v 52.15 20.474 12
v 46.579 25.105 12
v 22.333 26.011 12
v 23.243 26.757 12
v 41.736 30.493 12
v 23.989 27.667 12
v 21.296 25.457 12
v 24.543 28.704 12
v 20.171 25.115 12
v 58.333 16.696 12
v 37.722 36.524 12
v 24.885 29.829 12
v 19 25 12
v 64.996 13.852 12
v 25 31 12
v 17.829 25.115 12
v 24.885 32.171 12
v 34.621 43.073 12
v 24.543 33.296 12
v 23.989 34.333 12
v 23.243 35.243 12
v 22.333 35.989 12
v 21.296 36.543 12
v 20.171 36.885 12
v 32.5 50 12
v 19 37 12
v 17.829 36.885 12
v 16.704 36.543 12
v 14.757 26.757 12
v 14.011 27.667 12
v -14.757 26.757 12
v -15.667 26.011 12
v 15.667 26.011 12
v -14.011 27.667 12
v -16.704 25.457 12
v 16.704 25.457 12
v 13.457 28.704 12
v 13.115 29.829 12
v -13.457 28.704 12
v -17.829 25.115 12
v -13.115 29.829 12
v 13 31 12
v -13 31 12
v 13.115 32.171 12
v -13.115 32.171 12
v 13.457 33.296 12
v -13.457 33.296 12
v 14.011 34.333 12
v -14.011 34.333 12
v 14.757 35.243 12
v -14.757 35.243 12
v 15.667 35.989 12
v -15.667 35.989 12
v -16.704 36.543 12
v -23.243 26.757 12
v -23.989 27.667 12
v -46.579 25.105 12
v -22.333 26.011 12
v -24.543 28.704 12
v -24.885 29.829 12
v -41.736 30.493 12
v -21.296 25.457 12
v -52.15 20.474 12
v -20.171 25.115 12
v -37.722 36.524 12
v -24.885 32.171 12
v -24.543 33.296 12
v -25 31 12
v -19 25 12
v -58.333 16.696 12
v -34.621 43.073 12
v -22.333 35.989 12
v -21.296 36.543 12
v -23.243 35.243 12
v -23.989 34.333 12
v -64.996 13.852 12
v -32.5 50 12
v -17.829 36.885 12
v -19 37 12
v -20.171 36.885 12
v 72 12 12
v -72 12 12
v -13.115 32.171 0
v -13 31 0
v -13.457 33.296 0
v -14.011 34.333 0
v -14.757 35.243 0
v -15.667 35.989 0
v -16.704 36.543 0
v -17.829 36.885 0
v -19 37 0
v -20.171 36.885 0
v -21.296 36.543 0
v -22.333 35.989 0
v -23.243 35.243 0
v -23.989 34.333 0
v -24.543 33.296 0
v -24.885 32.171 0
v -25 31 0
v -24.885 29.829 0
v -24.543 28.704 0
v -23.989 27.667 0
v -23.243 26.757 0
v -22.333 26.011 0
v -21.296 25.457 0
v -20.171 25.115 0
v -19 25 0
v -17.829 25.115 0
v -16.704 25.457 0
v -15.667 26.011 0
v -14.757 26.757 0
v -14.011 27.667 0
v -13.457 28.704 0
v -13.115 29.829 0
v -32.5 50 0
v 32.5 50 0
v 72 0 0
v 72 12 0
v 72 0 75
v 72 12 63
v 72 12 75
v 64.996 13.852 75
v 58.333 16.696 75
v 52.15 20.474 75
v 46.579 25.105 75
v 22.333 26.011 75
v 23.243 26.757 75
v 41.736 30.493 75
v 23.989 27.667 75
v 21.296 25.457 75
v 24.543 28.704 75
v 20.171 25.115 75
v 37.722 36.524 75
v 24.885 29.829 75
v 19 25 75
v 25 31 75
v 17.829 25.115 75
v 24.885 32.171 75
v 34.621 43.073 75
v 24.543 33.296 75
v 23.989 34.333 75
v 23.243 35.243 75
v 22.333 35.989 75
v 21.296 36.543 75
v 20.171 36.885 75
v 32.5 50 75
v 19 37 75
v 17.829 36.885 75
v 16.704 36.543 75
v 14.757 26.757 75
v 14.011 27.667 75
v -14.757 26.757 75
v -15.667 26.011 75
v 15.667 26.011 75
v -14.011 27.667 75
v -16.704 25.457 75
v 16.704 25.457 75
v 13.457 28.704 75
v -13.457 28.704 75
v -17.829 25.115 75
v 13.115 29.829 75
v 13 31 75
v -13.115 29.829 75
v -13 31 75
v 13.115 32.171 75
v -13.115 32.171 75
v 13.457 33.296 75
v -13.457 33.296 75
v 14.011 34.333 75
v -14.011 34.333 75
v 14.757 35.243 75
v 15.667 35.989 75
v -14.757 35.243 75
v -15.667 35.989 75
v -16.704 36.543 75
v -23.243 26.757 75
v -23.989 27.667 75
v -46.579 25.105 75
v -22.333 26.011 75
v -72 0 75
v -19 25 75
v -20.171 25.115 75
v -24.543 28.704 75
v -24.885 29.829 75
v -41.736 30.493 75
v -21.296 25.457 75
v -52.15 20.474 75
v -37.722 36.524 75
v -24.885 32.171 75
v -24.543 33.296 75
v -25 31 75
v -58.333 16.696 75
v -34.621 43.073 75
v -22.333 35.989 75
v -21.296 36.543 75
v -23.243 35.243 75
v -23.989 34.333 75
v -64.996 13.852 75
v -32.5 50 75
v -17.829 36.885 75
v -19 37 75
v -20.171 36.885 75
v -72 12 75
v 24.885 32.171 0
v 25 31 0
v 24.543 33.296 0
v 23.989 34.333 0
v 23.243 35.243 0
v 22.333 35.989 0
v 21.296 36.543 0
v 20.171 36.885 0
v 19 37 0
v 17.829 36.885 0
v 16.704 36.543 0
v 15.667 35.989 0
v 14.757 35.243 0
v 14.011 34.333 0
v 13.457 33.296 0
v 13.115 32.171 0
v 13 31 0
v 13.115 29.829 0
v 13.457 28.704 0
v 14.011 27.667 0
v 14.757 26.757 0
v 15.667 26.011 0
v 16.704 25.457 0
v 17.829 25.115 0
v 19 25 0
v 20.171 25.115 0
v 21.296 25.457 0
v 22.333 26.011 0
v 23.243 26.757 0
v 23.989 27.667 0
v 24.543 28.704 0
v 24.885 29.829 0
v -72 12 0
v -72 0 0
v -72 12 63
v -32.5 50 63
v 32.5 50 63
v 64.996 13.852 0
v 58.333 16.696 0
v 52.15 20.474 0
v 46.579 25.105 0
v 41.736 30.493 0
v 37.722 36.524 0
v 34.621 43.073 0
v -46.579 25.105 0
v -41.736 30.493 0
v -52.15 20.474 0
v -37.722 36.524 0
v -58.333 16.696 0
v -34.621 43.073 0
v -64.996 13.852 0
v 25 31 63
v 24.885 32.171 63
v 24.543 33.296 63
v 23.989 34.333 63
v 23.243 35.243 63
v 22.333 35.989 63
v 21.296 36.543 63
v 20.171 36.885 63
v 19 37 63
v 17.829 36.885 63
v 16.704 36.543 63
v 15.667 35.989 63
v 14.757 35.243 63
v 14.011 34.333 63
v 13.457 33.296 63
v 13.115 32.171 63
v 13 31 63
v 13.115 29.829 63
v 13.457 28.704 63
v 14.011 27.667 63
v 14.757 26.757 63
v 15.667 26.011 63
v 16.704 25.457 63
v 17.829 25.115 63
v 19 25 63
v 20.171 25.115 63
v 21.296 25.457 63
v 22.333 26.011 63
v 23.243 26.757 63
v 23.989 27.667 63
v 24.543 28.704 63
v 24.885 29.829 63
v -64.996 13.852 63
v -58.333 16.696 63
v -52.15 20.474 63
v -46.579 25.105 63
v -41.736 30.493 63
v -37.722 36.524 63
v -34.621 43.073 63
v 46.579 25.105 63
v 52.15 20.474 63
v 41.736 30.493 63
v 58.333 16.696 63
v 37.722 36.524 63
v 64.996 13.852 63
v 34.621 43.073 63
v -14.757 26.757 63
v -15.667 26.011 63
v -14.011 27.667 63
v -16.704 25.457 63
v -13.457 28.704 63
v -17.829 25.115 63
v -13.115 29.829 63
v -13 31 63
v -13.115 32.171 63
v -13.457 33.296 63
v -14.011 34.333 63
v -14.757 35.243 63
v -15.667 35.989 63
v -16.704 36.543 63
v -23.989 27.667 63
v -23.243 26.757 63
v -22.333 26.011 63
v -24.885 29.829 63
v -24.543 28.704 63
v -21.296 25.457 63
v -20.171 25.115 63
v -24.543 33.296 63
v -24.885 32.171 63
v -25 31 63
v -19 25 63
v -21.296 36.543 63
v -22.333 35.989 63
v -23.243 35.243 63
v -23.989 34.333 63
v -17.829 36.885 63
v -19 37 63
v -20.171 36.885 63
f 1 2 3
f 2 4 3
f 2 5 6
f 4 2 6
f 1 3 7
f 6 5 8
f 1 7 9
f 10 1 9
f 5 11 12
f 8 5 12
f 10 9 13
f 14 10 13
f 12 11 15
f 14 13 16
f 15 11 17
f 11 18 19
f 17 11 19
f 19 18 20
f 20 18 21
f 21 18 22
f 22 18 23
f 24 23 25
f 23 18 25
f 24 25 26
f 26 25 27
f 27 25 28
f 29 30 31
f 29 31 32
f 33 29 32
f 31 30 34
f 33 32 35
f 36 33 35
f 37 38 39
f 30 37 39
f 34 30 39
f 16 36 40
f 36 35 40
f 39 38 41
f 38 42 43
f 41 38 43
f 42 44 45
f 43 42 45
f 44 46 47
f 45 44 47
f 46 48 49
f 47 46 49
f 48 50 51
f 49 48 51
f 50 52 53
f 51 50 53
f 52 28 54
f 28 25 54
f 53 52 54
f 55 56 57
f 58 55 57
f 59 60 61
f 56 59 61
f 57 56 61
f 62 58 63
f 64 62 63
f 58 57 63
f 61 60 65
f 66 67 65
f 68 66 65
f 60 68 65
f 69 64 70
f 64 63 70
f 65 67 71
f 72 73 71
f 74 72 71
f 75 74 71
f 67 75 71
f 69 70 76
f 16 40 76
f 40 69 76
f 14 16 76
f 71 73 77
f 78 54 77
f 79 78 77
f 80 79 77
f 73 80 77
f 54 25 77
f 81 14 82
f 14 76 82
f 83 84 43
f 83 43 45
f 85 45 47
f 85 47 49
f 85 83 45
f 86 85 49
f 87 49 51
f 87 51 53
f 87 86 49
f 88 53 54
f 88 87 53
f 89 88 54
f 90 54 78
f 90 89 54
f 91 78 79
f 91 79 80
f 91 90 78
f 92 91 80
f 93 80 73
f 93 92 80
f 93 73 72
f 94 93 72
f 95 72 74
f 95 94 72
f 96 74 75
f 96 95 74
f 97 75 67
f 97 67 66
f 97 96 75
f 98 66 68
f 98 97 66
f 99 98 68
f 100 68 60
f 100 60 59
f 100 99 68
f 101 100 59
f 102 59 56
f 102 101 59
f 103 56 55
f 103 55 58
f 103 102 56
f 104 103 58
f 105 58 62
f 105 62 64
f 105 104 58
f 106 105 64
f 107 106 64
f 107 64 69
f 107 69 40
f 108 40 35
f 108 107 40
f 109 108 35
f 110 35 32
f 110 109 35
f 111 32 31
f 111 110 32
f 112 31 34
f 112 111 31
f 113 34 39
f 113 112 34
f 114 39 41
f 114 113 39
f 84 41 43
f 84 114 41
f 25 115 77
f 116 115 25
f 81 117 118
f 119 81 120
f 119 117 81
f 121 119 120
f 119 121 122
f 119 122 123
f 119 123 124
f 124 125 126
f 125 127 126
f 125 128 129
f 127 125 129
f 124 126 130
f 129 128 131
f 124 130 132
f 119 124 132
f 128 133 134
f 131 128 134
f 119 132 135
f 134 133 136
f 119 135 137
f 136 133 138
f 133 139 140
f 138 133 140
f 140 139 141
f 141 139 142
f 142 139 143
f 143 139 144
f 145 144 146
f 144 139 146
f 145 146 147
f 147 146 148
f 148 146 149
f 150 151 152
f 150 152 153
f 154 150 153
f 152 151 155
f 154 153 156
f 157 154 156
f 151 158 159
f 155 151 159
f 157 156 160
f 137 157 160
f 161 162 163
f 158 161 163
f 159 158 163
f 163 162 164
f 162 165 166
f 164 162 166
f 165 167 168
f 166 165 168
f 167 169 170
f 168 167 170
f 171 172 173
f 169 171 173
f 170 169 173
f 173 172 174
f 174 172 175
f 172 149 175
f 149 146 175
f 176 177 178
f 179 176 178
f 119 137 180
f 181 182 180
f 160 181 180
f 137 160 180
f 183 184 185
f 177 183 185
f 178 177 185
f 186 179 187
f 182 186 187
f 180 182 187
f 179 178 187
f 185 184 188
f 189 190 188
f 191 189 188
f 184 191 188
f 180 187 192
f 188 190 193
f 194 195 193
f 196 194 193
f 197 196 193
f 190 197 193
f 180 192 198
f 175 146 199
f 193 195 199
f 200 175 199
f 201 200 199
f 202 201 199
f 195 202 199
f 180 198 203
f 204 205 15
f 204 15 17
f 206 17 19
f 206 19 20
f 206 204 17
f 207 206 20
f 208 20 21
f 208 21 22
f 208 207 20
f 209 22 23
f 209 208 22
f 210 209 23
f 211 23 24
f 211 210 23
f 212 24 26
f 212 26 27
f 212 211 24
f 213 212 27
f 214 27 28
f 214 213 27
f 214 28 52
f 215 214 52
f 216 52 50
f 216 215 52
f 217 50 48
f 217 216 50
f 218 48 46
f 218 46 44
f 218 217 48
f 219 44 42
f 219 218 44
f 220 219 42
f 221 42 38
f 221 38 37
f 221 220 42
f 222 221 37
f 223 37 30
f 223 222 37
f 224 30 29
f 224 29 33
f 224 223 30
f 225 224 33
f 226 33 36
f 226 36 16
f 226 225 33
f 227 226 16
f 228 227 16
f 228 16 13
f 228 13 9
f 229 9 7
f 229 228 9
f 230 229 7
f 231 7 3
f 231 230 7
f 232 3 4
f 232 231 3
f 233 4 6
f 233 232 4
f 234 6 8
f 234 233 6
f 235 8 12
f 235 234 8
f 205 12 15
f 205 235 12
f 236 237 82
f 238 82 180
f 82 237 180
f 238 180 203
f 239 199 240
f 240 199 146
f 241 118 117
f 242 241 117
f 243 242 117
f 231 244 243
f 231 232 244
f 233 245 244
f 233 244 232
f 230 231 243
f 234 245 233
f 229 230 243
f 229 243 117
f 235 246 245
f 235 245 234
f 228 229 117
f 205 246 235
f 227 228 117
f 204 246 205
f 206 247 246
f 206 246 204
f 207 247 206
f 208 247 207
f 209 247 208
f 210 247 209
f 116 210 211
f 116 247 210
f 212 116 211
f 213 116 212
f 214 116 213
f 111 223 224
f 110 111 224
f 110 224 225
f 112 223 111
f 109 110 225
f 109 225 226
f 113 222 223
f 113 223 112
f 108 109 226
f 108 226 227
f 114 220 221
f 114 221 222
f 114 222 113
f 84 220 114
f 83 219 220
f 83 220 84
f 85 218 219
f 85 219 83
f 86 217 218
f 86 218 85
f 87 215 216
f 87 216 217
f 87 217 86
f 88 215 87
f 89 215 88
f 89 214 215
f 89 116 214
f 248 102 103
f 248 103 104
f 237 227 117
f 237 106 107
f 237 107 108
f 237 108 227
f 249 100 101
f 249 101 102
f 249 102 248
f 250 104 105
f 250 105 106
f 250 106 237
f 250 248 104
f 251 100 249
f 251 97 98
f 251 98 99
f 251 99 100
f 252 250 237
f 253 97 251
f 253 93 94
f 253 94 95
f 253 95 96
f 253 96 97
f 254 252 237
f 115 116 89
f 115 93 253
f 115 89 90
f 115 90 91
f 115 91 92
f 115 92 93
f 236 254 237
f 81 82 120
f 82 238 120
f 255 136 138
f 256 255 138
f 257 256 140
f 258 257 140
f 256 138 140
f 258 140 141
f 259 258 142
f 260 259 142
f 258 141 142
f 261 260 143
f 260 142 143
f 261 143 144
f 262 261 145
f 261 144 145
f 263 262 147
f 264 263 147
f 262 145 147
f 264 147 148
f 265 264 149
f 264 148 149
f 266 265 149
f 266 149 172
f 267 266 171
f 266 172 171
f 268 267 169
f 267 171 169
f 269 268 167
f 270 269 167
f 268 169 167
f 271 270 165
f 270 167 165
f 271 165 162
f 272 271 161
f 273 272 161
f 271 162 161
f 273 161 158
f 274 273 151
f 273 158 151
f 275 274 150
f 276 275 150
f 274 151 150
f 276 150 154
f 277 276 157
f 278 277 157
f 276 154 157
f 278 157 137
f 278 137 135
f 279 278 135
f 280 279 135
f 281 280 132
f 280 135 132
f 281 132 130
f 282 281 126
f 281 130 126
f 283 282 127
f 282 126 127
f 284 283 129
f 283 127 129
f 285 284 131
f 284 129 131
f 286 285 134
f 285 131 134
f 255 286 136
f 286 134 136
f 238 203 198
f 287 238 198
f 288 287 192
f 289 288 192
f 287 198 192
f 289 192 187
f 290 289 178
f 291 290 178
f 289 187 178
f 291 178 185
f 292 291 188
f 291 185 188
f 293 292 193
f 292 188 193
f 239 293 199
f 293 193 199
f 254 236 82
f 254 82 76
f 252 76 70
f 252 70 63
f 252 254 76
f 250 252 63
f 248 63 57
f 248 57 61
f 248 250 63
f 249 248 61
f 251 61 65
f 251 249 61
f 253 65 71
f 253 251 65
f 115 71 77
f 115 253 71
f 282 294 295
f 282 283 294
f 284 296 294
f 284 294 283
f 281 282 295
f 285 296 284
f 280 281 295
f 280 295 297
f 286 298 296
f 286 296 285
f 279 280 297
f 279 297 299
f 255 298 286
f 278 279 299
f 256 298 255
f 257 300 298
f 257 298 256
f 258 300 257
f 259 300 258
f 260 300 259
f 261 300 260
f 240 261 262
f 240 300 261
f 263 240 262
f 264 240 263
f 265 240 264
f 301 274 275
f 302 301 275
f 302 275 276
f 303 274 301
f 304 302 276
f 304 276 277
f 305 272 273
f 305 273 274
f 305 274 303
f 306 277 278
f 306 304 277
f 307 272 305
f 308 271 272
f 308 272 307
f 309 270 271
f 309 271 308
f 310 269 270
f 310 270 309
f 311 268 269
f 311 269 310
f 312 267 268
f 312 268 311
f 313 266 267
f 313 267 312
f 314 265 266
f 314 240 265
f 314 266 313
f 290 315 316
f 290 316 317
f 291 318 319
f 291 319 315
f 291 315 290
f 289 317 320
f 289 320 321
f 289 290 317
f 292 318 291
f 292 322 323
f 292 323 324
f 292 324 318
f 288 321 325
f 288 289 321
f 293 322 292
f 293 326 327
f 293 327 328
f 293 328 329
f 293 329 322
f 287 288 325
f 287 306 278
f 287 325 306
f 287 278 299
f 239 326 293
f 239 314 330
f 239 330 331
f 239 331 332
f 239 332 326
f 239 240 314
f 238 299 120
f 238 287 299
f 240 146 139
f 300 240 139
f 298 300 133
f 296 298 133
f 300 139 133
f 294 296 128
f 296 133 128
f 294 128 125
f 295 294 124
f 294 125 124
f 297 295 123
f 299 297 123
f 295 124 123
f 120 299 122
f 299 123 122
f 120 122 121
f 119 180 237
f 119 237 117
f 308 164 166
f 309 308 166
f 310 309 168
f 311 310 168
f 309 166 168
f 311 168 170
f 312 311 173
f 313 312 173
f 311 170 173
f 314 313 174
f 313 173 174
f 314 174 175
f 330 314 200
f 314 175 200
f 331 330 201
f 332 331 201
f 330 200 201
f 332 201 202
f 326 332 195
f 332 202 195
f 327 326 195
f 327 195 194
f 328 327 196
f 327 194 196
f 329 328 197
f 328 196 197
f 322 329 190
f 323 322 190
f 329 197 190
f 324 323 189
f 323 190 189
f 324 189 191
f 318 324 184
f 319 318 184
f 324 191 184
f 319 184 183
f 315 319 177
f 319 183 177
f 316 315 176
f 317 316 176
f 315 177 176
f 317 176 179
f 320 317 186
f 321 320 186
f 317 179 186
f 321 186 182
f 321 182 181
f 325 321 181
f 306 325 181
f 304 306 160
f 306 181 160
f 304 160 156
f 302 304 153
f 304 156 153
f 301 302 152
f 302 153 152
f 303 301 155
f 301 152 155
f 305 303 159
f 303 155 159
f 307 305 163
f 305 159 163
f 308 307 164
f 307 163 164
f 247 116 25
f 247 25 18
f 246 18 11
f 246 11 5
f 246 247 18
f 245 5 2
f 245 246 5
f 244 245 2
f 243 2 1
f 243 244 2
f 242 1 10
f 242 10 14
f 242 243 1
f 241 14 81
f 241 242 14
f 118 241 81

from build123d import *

# Parameters (mm, degrees)
SKETCH1_R                = 6
BOSS_EXTRUDE2_DEPTH      = 12
SKETCH3_W                = 144
SKETCH3_H                = 12
BOSS_EXTRUDE3_DEPTH      = 25.5
BOSS_EXTRUDE3_DEPTH_BACK = 25.5


with BuildPart() as part:
    # Sketch1 → Boss-Extrude2 (new body)
    with BuildSketch(Plane.XY):
        with BuildLine():
            Line((-32.5, 50), (32.5, 50))
            ThreePointArc((32.5, 50), (46.579087682, 25.10523588), (72, 12))
            Line((72, 12), (72, 0))
            Line((72, 0), (-72, 0))
            Line((-72, 0), (-72, 12))
            ThreePointArc((-72, 12), (-46.579087682, 25.10523588), (-32.5, 50))
        make_face()
        with Locations((19, 31)):
            Circle(SKETCH1_R, mode=Mode.SUBTRACT)
        with Locations((-19, 31)):
            Circle(SKETCH1_R, mode=Mode.SUBTRACT)
    extrude(amount=BOSS_EXTRUDE2_DEPTH)


with BuildPart() as body_2:
    # Mirror1: mirrored copy
    add(part.part.mirror(Plane.XY.offset(37.5)))


with BuildPart() as part_1:
    add(part.part)

    add(body_2.part)  # Boss-Extrude3 merges body 2
    # Sketch3 → Boss-Extrude3 (add, two sides)
    with BuildSketch(Plane.XY.offset(37.5)) as boss_extrude3_sk:
        with Locations((0, 6)):
            Rectangle(SKETCH3_W, SKETCH3_H)
    extrude(amount=BOSS_EXTRUDE3_DEPTH)
    extrude(boss_extrude3_sk.sketch, amount=-BOSS_EXTRUDE3_DEPTH_BACK)


solid = part_1.part
